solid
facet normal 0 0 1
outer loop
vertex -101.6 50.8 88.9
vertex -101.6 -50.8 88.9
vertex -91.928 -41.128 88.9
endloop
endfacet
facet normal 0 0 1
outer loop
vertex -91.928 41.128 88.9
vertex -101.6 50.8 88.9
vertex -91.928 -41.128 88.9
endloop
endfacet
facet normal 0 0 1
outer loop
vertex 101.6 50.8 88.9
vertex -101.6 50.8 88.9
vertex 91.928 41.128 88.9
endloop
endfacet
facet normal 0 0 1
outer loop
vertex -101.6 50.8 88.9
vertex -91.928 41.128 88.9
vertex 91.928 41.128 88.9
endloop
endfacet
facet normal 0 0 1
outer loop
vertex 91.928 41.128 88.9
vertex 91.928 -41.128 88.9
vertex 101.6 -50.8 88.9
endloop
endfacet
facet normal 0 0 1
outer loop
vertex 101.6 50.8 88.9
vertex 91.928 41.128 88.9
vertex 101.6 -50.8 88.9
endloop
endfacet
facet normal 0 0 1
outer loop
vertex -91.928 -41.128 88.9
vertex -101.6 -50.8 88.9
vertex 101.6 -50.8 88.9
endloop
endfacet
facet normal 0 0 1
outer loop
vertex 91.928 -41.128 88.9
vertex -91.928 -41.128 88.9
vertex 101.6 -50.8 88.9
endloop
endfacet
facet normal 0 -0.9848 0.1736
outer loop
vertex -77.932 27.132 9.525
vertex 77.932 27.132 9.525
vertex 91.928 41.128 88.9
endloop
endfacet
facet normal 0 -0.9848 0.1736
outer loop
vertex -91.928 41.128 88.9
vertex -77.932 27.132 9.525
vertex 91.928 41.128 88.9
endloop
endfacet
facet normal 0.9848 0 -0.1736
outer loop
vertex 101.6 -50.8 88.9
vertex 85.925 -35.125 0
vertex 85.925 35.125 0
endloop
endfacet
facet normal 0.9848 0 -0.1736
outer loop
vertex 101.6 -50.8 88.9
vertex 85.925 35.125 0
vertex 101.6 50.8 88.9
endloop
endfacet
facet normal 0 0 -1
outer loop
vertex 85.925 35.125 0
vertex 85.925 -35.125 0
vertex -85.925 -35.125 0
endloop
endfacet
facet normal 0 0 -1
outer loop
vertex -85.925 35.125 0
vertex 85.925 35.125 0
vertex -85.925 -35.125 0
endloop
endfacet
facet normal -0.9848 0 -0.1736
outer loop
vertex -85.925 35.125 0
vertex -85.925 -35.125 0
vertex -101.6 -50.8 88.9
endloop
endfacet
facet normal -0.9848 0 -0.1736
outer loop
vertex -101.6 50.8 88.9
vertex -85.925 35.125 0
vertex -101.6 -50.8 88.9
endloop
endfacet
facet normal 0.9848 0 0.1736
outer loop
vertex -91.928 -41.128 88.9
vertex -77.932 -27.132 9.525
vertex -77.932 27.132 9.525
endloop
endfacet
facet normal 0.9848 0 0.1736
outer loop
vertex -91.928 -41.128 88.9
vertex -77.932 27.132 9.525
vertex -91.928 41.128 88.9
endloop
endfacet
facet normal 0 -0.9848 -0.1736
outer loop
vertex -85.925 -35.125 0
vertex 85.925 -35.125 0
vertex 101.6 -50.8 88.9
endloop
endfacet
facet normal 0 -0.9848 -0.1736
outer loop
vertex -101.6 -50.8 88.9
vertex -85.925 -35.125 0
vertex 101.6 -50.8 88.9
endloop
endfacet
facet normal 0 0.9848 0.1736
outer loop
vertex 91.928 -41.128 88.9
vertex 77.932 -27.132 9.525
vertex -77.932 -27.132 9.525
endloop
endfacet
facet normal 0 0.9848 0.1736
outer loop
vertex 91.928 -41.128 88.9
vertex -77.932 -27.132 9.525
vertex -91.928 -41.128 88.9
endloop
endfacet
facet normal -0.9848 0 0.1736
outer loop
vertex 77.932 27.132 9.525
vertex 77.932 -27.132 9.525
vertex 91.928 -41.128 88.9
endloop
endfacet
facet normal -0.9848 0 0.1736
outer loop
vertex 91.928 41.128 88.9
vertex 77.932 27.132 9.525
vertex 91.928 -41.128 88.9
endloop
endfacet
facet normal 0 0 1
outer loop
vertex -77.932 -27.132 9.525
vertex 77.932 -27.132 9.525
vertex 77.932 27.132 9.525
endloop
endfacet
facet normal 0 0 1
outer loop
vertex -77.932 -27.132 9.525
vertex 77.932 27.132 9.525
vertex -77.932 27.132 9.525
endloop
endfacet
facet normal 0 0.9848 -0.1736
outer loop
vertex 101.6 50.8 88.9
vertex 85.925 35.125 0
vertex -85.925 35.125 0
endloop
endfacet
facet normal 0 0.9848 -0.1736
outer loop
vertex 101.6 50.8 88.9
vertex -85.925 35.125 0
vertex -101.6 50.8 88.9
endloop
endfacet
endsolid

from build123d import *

# Parameters (mm, degrees)
F1_DEPTH = 50.8
F3_DEPTH = 101.601
F6_T     = -9.525


with BuildPart() as f1:
    # F0 (on Front) → F1 (new body)
    with BuildSketch(Plane.XZ):
        Polygon((0, 88.9), (0, 0), (85.924531, 0), (101.6, 88.9), align=None)
    extrude(amount=F1_DEPTH)

    # F2 (on Right) → F3 (cut, through all)
    with BuildSketch(Plane.YZ):
        Polygon((-35.124531, 0), (-50.8, 88.9), (-50.8, 0), align=None)
    extrude(amount=F3_DEPTH, mode=Mode.SUBTRACT)

    # F4: F1 across plane


with BuildPart() as f1_1:
    add(f1.part)
    add(f1.part.mirror(Plane.XZ))

    # F5: F1 across plane


with BuildPart() as f1_2:
    add(f1_1.part)
    add(f1_1.part.mirror(Plane.YZ))

    # F6
    f6_openings = [f1_2.faces().sort_by_distance(p)[0] for p in [
        (0, 0, 88.9),
    ]]
    offset(amount=F6_T, openings=f6_openings)


solid = f1_2.part
